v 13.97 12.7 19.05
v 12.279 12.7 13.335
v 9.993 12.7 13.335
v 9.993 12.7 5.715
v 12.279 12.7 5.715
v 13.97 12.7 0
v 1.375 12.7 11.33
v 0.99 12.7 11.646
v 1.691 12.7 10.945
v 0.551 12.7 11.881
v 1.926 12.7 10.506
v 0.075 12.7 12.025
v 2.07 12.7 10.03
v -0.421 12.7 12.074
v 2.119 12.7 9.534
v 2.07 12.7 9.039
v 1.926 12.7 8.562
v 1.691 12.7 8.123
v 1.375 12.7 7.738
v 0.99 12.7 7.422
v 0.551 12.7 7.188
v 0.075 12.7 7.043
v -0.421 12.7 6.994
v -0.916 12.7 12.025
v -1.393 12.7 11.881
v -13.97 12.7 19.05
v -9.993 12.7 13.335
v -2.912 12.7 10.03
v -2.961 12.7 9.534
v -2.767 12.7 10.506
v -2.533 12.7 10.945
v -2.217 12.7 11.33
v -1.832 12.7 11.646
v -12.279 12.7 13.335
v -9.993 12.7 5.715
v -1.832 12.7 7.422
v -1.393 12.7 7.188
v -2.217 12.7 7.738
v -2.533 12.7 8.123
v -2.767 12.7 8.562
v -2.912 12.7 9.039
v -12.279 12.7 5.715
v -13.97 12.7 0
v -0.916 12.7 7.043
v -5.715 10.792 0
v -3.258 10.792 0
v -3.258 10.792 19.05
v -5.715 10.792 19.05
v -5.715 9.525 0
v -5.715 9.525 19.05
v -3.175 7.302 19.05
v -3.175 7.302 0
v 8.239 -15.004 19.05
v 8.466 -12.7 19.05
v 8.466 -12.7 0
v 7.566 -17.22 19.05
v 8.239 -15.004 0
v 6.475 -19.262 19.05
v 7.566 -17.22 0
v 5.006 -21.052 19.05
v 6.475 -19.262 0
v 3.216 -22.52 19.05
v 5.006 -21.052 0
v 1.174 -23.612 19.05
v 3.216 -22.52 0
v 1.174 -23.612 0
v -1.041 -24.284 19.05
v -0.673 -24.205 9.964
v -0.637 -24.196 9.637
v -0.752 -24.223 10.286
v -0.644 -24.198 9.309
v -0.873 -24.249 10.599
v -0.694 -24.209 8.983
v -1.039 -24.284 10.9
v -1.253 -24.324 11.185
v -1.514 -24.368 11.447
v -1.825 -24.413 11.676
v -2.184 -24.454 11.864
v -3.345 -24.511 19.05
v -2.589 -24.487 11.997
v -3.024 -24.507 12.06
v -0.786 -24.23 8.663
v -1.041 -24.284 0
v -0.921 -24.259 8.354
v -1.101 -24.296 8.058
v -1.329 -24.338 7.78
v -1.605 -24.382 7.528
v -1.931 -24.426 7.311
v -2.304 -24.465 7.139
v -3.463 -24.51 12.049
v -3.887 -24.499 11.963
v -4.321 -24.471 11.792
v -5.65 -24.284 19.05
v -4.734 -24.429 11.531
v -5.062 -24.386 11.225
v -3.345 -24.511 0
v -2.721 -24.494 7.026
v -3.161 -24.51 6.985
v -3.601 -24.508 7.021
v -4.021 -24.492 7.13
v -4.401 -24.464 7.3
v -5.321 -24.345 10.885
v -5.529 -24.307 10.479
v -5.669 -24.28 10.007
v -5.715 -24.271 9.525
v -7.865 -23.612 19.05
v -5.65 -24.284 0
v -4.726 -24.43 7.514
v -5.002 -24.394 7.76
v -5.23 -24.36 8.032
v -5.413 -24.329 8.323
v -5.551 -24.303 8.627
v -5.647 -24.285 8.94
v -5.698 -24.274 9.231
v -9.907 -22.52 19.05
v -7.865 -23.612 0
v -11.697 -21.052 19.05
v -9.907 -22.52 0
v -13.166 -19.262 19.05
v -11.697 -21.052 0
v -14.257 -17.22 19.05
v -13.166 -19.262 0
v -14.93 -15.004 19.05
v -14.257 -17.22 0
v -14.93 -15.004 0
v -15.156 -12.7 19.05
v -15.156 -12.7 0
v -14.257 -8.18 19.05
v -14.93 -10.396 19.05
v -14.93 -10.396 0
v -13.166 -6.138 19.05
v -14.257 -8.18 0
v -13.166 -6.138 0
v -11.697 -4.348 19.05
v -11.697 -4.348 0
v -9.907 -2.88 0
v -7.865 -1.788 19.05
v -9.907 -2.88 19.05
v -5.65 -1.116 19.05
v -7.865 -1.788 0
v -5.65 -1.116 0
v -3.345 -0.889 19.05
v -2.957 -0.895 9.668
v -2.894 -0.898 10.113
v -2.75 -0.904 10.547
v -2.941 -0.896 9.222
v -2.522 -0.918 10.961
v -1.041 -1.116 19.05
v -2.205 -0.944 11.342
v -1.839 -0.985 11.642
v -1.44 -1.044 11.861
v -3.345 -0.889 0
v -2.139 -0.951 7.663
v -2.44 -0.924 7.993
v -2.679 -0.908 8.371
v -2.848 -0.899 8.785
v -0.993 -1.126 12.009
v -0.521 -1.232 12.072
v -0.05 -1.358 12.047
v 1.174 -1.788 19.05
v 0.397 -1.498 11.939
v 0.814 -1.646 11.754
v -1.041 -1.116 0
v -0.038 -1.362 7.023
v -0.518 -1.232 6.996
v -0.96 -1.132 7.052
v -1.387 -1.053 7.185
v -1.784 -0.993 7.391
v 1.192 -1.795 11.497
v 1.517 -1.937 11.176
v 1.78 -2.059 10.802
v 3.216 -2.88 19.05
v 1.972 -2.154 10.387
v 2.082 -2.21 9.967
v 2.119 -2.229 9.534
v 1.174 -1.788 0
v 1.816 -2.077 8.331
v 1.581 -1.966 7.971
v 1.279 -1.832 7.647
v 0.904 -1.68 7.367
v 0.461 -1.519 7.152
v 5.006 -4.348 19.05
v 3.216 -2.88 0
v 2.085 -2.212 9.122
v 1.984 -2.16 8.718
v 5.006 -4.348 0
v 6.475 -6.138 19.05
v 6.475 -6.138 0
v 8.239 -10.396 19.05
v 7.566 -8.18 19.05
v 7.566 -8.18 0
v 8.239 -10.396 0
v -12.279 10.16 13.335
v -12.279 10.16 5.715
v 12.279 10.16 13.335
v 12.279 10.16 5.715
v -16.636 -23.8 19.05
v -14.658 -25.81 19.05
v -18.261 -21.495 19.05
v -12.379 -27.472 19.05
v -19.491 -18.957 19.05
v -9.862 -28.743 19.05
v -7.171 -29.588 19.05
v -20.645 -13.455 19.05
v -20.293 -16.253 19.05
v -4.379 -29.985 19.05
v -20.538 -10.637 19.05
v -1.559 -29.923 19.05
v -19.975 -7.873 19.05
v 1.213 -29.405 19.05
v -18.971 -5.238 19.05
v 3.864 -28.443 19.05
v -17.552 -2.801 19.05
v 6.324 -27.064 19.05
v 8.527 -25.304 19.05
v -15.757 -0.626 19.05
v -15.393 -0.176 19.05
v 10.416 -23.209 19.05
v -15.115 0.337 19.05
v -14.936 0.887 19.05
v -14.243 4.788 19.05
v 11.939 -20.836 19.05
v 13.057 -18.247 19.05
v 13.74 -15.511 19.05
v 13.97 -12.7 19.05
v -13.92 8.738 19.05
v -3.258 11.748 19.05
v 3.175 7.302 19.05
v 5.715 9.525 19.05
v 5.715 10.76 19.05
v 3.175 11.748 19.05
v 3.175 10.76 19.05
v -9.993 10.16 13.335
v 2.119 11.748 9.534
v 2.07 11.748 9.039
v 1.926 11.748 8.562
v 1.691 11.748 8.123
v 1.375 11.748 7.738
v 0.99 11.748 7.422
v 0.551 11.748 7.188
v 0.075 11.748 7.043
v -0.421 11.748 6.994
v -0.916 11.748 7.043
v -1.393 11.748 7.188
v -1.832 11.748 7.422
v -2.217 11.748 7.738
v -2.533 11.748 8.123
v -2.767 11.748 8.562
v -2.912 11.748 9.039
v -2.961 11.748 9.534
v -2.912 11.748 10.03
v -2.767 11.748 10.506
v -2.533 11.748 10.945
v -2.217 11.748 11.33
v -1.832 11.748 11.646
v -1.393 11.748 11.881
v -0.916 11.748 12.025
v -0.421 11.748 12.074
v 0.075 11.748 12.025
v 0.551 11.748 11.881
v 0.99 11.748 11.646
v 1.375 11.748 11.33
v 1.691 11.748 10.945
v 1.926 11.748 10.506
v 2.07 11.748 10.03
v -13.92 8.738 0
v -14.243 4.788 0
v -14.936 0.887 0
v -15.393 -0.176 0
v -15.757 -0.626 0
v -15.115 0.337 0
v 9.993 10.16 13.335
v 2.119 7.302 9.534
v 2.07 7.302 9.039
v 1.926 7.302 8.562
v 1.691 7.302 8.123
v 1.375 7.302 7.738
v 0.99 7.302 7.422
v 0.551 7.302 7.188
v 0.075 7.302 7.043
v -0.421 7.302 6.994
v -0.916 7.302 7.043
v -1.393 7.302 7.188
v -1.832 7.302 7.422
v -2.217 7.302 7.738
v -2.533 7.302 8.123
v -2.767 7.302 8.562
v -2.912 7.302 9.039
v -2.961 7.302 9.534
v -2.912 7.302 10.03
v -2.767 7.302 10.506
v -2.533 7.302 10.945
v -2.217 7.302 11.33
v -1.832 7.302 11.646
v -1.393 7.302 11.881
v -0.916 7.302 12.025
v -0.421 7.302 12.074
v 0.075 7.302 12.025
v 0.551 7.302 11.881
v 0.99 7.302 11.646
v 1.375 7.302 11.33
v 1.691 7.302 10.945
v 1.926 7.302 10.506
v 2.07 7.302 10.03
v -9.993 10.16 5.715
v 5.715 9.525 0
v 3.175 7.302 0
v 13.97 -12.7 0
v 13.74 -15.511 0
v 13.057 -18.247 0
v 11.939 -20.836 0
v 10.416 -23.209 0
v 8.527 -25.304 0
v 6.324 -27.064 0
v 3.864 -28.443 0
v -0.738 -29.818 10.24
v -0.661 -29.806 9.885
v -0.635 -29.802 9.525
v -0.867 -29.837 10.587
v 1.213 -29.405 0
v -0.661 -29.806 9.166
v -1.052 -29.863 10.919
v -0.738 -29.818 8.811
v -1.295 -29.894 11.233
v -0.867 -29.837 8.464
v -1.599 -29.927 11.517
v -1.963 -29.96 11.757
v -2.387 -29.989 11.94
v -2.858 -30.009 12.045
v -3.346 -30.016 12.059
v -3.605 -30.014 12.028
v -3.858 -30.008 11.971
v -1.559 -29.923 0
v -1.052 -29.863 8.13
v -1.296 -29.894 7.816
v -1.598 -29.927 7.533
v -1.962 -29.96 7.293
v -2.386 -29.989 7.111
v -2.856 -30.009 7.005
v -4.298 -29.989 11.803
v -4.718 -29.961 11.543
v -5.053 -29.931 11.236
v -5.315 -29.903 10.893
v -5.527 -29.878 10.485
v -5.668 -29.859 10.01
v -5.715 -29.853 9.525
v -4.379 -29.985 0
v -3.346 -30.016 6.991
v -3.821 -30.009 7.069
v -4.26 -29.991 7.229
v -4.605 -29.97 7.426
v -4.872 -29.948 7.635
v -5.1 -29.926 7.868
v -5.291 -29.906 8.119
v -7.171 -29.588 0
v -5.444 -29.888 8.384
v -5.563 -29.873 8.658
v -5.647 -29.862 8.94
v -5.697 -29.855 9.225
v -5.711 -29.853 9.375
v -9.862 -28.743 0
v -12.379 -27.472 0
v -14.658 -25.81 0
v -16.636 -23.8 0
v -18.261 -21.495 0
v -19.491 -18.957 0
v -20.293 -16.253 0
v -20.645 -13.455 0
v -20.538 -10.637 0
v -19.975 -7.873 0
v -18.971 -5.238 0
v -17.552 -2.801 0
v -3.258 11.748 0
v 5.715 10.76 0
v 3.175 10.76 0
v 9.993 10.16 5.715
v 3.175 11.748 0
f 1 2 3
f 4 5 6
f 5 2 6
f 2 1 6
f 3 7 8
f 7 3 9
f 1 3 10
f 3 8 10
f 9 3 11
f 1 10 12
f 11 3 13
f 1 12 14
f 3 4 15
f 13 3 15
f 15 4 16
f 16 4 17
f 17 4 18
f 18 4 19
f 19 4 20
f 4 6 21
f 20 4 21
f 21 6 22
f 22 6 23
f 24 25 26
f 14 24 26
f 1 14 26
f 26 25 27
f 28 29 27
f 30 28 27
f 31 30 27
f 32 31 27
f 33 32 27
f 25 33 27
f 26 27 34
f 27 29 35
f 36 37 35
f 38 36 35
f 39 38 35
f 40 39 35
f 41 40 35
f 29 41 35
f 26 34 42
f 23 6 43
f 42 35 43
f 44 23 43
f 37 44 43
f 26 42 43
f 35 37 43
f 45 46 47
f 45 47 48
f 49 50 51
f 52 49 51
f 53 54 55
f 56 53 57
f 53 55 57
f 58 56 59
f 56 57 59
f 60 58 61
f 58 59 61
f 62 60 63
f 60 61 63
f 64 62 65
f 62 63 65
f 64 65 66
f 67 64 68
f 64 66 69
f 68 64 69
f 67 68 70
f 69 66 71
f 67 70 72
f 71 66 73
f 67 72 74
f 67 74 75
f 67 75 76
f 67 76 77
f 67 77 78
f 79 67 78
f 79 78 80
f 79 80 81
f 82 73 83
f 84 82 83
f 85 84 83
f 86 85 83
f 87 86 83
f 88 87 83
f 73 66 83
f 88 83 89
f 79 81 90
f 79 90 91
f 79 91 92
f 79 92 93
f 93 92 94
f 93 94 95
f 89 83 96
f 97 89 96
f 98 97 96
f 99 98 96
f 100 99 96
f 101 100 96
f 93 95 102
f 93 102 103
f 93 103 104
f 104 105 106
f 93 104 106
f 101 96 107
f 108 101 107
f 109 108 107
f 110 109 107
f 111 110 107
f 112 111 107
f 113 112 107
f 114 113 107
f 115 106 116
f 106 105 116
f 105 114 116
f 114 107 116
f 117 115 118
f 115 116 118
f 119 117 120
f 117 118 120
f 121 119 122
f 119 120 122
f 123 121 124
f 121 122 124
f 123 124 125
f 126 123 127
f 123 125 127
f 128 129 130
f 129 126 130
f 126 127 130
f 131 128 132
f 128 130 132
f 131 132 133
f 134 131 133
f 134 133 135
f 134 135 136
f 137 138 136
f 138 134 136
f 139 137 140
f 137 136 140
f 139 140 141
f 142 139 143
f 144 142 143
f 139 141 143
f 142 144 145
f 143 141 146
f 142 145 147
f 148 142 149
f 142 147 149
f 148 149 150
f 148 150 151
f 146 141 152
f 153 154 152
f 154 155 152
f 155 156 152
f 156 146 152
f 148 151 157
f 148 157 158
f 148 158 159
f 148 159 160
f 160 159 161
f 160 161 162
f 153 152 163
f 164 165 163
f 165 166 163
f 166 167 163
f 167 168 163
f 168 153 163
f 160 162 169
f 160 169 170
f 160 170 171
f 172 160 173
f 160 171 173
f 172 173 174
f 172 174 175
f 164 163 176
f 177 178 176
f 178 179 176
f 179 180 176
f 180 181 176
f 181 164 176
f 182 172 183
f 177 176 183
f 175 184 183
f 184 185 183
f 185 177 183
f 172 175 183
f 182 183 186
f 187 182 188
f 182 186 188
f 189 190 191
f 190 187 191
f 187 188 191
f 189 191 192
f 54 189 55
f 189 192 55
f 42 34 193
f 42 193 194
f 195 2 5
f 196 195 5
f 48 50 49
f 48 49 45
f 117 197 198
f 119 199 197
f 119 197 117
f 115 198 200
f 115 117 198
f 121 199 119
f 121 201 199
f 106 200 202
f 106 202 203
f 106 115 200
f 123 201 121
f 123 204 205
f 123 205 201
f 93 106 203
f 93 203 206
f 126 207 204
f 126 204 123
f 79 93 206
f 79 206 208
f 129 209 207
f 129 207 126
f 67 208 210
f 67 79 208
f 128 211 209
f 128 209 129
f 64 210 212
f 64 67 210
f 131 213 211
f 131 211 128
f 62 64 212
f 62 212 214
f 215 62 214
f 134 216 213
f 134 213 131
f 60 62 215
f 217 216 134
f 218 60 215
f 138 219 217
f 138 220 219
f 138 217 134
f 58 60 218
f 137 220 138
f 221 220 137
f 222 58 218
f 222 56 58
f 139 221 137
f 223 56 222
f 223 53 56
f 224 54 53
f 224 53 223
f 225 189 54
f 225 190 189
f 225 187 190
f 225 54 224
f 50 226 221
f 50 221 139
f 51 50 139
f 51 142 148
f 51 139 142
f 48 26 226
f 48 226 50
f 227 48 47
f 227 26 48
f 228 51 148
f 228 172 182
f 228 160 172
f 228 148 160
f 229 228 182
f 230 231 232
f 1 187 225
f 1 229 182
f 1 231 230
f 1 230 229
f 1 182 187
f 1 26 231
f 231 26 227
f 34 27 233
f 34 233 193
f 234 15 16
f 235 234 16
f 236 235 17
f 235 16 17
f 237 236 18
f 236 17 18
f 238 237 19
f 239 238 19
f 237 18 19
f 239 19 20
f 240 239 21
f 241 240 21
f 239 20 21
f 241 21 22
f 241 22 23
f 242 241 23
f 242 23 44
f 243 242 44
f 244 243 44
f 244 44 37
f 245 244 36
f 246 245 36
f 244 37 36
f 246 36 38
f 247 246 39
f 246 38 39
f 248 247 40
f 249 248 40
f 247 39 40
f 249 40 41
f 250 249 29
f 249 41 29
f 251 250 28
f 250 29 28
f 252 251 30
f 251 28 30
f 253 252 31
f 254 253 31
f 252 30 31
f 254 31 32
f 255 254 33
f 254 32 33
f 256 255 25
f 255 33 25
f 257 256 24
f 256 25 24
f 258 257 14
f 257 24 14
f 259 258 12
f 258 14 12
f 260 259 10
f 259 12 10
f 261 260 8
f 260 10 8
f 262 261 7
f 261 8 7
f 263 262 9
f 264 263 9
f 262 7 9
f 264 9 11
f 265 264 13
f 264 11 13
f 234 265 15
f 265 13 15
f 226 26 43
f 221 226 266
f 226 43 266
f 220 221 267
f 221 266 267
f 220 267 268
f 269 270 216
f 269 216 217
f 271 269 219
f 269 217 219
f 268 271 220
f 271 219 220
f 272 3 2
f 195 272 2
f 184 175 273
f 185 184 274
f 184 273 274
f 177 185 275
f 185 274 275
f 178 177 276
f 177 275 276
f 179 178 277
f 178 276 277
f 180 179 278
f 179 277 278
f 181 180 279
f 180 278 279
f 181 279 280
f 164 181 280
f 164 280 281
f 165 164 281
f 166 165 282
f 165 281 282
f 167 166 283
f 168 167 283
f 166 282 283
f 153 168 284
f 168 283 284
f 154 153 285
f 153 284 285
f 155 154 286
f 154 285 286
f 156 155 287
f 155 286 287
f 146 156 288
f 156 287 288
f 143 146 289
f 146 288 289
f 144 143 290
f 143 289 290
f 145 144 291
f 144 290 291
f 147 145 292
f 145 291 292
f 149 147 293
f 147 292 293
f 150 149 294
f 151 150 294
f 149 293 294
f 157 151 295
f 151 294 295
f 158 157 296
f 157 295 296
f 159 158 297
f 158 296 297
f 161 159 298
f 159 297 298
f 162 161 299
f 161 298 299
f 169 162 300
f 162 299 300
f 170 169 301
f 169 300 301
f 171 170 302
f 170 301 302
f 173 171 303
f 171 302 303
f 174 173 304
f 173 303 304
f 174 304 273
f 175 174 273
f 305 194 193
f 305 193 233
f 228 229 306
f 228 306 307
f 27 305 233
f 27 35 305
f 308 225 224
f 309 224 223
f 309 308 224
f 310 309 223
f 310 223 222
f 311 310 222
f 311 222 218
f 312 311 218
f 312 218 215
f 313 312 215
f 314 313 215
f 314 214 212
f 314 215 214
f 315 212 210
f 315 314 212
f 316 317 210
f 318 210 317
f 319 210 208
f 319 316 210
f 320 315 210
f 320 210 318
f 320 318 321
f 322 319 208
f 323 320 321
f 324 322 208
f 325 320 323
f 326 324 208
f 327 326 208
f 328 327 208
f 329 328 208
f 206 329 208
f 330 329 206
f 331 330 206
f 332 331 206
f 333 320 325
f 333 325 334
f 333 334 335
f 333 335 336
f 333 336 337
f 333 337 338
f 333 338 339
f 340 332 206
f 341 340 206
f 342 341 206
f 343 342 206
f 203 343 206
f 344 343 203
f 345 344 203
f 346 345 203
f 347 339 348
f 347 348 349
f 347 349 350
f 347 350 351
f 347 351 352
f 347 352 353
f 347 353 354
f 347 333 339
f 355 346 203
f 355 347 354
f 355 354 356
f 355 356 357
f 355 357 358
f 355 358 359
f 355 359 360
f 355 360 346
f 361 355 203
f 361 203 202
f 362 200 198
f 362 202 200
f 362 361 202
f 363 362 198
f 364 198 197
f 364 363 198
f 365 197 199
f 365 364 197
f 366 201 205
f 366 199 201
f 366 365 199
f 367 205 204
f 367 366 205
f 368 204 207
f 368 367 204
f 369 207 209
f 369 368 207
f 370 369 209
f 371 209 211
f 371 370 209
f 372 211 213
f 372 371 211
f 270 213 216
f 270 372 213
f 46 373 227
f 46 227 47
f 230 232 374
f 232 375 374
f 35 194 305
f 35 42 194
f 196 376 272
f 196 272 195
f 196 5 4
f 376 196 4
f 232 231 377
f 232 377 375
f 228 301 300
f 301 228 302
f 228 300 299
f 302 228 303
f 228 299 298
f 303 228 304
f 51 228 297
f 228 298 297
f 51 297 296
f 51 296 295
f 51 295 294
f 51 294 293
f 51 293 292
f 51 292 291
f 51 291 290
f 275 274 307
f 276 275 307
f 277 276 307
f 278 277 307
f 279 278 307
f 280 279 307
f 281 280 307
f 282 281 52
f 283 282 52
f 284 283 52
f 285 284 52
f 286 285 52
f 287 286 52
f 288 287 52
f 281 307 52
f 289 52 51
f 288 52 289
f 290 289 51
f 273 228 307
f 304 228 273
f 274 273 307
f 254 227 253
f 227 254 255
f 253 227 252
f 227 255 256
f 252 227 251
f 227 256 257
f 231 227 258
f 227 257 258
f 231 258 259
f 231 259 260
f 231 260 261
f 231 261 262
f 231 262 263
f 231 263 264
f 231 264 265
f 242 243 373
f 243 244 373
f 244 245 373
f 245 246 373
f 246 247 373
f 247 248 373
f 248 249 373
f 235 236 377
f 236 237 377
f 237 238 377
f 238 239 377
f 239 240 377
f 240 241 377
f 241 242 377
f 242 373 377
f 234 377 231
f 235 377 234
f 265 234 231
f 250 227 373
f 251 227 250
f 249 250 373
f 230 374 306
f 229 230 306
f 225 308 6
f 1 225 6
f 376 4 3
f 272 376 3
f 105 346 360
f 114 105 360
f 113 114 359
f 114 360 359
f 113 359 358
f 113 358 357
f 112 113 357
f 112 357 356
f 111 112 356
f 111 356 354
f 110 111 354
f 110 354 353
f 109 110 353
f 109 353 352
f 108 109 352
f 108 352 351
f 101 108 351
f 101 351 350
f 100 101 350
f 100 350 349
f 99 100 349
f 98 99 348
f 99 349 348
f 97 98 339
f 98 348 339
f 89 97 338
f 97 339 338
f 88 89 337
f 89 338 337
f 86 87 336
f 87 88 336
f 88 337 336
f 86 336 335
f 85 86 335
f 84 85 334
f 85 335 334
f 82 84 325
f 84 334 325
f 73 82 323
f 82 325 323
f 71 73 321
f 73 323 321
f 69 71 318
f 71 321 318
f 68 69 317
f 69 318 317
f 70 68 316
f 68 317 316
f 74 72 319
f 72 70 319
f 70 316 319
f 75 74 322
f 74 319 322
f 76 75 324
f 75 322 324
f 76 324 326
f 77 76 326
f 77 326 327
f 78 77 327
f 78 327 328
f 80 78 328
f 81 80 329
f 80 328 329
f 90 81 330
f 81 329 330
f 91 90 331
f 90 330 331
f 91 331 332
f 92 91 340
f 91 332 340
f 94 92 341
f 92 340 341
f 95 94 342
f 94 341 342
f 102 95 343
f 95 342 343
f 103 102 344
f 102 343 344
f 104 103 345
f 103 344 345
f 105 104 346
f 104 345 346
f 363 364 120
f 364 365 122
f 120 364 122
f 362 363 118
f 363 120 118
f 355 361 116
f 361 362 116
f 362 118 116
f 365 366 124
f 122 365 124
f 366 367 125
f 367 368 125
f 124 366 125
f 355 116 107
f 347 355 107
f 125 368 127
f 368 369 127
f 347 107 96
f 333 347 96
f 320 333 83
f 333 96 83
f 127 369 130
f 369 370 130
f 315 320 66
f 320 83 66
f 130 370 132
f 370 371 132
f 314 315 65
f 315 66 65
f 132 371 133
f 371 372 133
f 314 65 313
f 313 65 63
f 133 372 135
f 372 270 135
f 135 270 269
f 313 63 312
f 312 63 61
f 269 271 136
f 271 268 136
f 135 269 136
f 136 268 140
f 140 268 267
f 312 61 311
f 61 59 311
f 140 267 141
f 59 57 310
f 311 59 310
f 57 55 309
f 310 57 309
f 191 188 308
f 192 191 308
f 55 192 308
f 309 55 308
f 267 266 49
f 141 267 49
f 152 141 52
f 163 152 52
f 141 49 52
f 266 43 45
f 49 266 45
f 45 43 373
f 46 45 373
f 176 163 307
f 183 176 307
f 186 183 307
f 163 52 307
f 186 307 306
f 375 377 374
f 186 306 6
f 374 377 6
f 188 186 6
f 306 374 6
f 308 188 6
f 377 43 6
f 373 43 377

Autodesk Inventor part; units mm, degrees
ref_plane "YZ Plane" through (0, 0, 0) normal (1, 0, 0) x (0, 1, 0)
sketch "Sketch1" plane through (0, 0, 0) normal (0, 0, 1) x (1, 0, 0)
  line L0 (-13.97, -12.7) -> (13.97, -12.7)
  line L1 (13.97, -12.7) -> (13.97, 12.7)
  line L2 (13.97, 12.7) -> (-13.97, 12.7)
  line L3 (-13.97, 12.7) -> (-13.97, -12.7)
  line L4 (-13.97, -12.7) -> (13.97, 12.7) construction
  line L5 (13.97, -12.7) -> (-13.97, 12.7) construction
  arc A0 (-13.97, -12.7) -> (13.97, -12.7) centre (0, -12.7) ccw
  circle A1 centre (-3.3455, -12.7) radius 11.811
  line L6 (0, -12.7) -> (-13.97, -12.7)
  line L7 (0, -12.7) -> (-6.985, -12.7)
  circle A2 centre (-3.3455, -12.7) radius 17.3155
  arc A3 (-20.6609, -12.7) -> (-13.97, 12.7) centre (-56.001, 10.1906) ccw
  point P0 (0, 0)
  point P1 (-15.1565, -0.038)
  dimension "d0" = 27.94
  dimension "d1" = 25.4
  dimension "d2" = 23.622
sketch "Sketch5" plane through (0, 0, 0) normal (0, 0, 1) x (1, 0, 0)
  line L0 (0, 12.7) -> (0, 6.35)
  line L1 (0, 12.7) -> (0, 9.525)
  line L2 (5.715, 7.3025) -> (-5.715, 7.3025)
  line L3 (-5.715, 7.3025) -> (-5.715, 11.7475)
  line L4 (-5.715, 11.7475) -> (5.715, 11.7475)
  line L5 (5.715, 11.7475) -> (5.715, 7.3025)
  line L6 (5.715, 7.3025) -> (-5.715, 11.7475) construction
  line L7 (-5.715, 7.3025) -> (5.715, 11.7475) construction
  line L8 (5.715, 11.7475) -> (3.175, 11.7475)
  line L9 (3.175, 11.7475) -> (3.175, 10.7597)
  line L10 (3.175, 10.7597) -> (5.715, 10.7597)
  line L11 (5.715, 10.7597) -> (5.715, 11.7475)
  line L12 (-5.715, 11.7475) -> (-3.2581, 11.7475)
  line L13 (-3.2581, 11.7475) -> (-3.2581, 10.792)
  line L14 (-3.2581, 10.792) -> (-5.715, 10.792)
  line L15 (-5.715, 10.792) -> (-5.715, 11.7475)
  line L16 (5.715, 9.525) -> (3.175, 7.3025)
  line L17 (-5.715, 9.525) -> (-3.175, 7.3025)
  point P0 (0, 0)
  point P1 (5.715, 10.7597)
  point P2 (-3.2581, 11.7475)
  point P3 (-5.715, 10.792)
  dimension "d5" = 4.445
  dimension "d6" = 11.43
  dimension "d7" = 2.54
ref_plane "Work Plane4" through (-13.97, 12.7, 0) normal (0, 1, 0) x (1, 0, 0)
sketch "Sketch6" plane through (-13.97, 12.7, 0) normal (0, 1, 0) x (1, 0, 0)
  circle A0 centre (13.5492, -9.5343) radius 2.54
  dimension "d19" = 5.08
extrude "Extrusion7" add sketch "Sketch1" along normal blind 19.05 contours A1 A0 A2 A3 L3 | L3 A2 L0 A1 | A1 L0 A0 | A2 A3 L3 | L3 A3 L2 L1 A2 | A3 A2 picked at (12.0052, -13.7923)
extrude "Extrusion8" cut sketch "Sketch5" along normal blind 20.32 contours L4 L9 L10 L5 L16 L2 L0 | L0 L2 L17 L3 L14 L13 L4
extrude "Extrusion9" cut sketch "Sketch6" against normal blind 15.24
fillet "Fillet1" radius 3.175 1 edges at (-15.1565, -0.038, 9.525)
sketch "Sketch10" plane through (-13.97, 12.7, 0) normal (0, 1, 0) x (1, 0, 0)
  line L0 (13.97, 0) -> (13.97, -20.32)
  line L1 (0.0748, -19.05) -> (0.0748, 0) projected
  line L2 (0.0748, -9.525) -> (27.94, -9.525)
  line L3 (27.94, 0) -> (27.94, -19.05) projected
  line L4 (3.9773, -13.335) -> (1.6913, -13.335)
  line L5 (1.6913, -13.335) -> (1.6913, -5.715)
  line L6 (1.6913, -5.715) -> (3.9773, -5.715)
  line L7 (3.9773, -5.715) -> (3.9773, -13.335)
  line L8 (3.9773, -13.335) -> (1.6913, -5.715) construction
  line L9 (1.6913, -13.335) -> (3.9773, -5.715) construction
  line L10 (23.9627, -13.335) -> (26.2487, -13.335)
  line L11 (26.2487, -13.335) -> (26.2487, -5.715)
  line L12 (26.2487, -5.715) -> (23.9627, -5.715)
  line L13 (23.9627, -5.715) -> (23.9627, -13.335)
  point P0 (2.8343, -9.525)
  dimension "d32" = 2.286
  dimension "d33" = 7.62
extrude "Extrusion10" cut sketch "Sketch10" against normal blind 2.54
ref_plane "Work Plane5" through (-3.3455, -30.0155, 0) normal (0, 1, 0) x (-1, 0, 0)
sketch "Sketch11" plane through (-3.3455, -30.0155, 0) normal (0, 1, 0) x (-1, 0, 0)
  line L0 (-0.1705, 0) -> (-0.1705, 19.05) projected
  circle A0 centre (-0.1705, 9.525) radius 2.54
  point P0 (-3.3455, 0)
  dimension "d36" = 5.08
extrude "Extrusion11" cut sketch "Sketch11" along normal blind 15.24
properties part number "MotorBearingHolder"
